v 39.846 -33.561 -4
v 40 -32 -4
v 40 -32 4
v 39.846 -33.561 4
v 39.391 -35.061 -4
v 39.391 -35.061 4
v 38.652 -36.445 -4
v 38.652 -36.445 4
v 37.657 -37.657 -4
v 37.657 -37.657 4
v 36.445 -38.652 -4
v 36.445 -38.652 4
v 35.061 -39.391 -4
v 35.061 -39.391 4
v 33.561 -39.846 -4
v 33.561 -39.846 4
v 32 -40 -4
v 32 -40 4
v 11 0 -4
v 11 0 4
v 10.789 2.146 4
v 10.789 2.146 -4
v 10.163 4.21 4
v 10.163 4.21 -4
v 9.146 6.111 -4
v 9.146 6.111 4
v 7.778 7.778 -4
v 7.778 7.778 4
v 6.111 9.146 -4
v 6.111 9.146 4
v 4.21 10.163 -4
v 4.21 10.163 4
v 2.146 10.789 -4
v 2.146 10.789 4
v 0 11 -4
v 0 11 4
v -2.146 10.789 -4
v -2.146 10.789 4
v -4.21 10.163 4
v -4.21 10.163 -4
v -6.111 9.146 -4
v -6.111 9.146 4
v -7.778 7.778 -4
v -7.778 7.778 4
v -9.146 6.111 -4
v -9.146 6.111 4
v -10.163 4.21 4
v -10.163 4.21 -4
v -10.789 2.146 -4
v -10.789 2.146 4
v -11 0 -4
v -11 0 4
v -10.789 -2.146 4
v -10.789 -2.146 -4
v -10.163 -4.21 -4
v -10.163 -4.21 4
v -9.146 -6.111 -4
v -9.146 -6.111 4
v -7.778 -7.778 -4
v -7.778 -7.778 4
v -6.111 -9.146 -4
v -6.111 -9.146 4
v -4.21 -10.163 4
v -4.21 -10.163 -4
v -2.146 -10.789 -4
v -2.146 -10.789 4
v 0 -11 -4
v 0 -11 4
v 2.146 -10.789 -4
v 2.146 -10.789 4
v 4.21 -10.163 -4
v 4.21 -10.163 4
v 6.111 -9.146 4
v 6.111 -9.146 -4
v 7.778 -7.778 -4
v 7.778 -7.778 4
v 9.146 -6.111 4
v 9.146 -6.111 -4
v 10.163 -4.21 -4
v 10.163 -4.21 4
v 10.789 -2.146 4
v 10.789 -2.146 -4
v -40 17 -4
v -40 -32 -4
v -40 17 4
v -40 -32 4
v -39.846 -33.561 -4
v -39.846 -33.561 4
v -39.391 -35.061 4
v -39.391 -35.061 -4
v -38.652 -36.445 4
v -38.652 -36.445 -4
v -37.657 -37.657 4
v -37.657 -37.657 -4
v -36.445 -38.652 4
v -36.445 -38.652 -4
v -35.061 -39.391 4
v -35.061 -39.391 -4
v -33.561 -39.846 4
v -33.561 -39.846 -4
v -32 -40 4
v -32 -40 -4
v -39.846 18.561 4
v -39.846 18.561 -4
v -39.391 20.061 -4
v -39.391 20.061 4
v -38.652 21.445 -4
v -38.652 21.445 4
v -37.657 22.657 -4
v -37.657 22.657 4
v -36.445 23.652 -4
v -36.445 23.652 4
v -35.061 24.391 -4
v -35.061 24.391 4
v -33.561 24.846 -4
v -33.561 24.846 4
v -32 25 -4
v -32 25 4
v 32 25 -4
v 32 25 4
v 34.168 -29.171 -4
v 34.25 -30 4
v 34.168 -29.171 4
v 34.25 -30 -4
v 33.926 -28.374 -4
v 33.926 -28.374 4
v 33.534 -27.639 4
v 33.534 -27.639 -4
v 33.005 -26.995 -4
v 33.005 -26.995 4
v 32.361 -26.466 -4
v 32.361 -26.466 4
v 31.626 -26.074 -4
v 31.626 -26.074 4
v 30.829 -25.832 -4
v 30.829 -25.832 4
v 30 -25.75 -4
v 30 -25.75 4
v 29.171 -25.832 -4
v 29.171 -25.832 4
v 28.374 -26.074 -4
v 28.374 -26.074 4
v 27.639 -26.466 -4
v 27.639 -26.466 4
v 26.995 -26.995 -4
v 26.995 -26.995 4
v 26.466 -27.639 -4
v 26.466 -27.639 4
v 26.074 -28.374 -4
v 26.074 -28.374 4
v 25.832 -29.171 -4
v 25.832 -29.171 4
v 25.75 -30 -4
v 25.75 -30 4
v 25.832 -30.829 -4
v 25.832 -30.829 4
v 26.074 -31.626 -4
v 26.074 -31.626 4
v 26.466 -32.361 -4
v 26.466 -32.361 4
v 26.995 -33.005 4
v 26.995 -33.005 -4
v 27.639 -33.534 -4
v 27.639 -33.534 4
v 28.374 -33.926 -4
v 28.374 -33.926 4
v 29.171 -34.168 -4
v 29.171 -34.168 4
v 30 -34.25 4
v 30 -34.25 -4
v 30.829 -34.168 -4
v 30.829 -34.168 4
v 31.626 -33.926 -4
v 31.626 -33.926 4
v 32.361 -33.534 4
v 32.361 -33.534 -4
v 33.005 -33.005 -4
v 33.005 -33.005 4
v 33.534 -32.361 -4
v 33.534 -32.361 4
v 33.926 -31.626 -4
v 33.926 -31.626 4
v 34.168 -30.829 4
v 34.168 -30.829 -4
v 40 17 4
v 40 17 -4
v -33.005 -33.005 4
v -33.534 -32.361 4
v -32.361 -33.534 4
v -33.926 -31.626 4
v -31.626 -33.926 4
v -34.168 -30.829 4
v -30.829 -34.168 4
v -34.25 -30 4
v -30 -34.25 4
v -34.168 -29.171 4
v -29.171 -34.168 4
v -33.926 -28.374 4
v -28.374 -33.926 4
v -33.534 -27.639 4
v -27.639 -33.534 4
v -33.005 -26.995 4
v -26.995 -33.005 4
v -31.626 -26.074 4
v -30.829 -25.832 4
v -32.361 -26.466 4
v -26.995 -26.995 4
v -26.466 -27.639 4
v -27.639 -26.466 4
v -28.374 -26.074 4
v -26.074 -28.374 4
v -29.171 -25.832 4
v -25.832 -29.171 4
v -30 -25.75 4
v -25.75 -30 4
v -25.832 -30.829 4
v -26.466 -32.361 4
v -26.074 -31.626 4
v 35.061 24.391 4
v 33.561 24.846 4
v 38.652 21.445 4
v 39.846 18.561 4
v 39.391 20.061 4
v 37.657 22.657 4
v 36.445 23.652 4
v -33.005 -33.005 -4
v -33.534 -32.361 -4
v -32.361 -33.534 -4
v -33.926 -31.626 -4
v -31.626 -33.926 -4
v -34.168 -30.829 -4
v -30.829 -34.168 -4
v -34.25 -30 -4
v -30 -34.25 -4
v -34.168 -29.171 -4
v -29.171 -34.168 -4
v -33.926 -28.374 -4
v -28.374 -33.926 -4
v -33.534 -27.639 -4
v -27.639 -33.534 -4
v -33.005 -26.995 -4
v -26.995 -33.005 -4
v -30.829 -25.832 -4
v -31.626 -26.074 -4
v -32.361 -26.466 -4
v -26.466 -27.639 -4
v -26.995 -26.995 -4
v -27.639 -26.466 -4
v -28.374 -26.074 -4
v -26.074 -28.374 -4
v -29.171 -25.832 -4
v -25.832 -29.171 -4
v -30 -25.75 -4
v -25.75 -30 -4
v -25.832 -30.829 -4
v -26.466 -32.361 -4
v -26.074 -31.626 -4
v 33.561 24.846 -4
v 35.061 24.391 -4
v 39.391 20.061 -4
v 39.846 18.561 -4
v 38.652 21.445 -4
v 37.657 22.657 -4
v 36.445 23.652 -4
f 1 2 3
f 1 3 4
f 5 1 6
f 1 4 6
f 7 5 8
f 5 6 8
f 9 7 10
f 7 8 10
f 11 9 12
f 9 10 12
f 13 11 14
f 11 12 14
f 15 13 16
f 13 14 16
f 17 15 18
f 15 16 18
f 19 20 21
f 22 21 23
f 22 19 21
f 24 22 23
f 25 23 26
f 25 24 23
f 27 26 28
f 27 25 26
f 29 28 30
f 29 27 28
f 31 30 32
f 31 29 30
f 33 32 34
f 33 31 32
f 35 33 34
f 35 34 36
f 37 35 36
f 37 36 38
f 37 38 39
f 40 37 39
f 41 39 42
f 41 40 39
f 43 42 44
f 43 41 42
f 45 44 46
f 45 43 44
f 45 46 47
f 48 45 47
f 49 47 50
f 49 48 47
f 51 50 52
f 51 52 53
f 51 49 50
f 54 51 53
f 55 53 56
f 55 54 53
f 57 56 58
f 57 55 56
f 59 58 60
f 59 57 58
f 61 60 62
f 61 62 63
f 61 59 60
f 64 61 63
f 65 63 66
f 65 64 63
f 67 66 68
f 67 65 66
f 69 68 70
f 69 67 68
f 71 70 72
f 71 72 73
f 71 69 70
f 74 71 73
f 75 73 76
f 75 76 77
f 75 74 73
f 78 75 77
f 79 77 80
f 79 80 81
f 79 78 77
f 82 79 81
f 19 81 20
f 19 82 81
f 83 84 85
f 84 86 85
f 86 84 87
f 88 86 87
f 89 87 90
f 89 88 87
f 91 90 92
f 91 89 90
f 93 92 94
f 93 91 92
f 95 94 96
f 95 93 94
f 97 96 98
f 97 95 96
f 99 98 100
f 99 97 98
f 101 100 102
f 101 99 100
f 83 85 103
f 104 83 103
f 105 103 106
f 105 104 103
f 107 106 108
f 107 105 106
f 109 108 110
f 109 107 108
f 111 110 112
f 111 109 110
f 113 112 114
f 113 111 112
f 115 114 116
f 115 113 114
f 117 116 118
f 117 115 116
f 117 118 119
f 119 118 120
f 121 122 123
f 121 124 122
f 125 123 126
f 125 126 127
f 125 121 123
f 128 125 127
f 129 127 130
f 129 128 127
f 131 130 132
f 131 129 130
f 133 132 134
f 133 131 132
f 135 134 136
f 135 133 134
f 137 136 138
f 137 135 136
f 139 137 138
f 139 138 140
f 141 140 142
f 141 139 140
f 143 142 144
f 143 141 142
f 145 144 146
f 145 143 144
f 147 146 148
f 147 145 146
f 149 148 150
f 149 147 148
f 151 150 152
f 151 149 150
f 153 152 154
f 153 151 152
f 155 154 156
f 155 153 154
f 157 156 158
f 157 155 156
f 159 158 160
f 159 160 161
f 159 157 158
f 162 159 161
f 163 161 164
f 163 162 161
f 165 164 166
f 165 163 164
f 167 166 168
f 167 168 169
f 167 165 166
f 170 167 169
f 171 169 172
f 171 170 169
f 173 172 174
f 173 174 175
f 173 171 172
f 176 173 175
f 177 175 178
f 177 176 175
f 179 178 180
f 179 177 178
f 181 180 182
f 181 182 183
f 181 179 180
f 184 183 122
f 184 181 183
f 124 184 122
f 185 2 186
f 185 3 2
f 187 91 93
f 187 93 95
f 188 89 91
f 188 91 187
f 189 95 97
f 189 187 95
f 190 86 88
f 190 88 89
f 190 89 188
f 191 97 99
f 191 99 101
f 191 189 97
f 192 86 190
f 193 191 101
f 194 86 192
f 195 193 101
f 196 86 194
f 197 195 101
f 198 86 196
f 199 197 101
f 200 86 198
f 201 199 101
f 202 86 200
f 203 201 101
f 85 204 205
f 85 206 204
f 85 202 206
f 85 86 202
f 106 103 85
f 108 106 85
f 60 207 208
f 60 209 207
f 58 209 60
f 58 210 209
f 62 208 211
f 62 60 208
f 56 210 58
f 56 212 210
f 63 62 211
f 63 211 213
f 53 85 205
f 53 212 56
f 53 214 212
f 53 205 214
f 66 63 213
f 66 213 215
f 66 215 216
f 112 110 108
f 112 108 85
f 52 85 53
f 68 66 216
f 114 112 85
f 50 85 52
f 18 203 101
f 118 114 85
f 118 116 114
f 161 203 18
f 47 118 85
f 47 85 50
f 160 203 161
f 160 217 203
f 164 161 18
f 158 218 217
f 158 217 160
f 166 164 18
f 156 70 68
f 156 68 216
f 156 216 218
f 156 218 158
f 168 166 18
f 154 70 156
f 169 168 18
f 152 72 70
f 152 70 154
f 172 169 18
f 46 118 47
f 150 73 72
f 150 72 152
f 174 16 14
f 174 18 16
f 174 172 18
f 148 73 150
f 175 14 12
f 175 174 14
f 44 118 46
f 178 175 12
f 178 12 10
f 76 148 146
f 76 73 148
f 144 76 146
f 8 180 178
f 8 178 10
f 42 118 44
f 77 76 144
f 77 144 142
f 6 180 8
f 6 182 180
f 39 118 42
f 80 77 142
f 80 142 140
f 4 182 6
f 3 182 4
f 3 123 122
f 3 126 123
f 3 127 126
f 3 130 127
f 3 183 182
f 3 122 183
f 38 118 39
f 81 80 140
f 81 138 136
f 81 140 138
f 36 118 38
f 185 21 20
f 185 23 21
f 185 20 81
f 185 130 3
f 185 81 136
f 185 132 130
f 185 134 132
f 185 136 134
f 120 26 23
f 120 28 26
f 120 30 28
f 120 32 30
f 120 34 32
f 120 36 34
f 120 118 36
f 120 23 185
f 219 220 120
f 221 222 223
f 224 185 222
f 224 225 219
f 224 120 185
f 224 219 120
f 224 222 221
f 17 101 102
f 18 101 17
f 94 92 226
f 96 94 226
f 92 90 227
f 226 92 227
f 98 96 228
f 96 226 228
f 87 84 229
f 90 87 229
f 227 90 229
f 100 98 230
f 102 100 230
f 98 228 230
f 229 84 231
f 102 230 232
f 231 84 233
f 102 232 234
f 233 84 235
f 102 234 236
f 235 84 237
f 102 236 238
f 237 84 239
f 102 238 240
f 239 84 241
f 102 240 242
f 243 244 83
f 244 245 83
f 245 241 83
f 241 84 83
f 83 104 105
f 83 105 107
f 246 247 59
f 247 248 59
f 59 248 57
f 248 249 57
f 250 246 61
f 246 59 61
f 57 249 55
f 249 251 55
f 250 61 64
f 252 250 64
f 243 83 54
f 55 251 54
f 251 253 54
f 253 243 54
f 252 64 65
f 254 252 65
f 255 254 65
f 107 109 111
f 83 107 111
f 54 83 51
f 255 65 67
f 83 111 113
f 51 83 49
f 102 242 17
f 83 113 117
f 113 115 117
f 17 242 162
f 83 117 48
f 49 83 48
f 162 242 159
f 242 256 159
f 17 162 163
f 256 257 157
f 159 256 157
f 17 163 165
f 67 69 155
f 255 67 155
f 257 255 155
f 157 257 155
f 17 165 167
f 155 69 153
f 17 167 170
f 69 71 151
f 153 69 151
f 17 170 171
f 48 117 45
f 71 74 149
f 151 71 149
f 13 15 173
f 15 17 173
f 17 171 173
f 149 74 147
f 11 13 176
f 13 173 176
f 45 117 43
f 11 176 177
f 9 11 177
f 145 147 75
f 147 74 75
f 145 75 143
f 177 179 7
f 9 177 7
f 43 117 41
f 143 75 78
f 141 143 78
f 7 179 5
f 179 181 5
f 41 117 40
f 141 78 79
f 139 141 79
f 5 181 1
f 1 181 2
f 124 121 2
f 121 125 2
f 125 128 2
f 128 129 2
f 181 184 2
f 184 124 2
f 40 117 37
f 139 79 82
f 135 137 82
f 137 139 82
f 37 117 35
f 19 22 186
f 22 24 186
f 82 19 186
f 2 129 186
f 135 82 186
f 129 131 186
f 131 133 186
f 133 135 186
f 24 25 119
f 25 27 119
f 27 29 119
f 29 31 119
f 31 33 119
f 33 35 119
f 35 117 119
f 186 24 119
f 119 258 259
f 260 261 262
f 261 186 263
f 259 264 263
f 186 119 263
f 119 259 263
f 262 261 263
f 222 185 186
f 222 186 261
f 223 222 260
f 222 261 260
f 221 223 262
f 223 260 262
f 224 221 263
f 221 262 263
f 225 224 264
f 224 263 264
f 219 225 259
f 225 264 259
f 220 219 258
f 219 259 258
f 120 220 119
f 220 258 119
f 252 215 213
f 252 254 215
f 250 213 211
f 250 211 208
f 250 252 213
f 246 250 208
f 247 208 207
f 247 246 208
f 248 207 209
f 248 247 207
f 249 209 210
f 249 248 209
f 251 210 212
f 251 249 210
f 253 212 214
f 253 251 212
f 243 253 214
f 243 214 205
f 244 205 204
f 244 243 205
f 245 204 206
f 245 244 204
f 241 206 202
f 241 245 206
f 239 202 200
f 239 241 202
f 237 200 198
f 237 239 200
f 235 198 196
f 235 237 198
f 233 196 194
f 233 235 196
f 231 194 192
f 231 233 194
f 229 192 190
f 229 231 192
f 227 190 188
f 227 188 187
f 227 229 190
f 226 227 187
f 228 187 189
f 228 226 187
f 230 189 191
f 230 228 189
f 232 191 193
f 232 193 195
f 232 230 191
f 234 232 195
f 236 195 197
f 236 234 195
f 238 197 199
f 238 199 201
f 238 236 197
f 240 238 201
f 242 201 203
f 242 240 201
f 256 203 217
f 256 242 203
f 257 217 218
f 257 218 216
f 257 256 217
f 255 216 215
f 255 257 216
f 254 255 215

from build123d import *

# Parameters (mm, degrees)
SKIZZE1_W                       = 80
SKIZZE1_H                       = 65
SKIZZE1_R                       = 11
SKIZZE1_R_2                     = 4.25
AUFSATZ_LINEAR_AUSTRAGEN1_DEPTH = 4
VERRUNDUNG1_R                   = 8


with BuildPart() as part:
    # Skizze1 → Aufsatz-Linear austragen1 (new, symmetric)
    with BuildSketch(Plane.XY):
        with Locations((0, -7.5)):
            Rectangle(SKIZZE1_W, SKIZZE1_H)
        Circle(SKIZZE1_R, mode=Mode.SUBTRACT)
        with Locations((-30, -30)):
            Circle(SKIZZE1_R_2, mode=Mode.SUBTRACT)
        with Locations((30, -30)):
            Circle(SKIZZE1_R_2, mode=Mode.SUBTRACT)
    extrude(amount=AUFSATZ_LINEAR_AUSTRAGEN1_DEPTH, both=True)

    # Verrundung1
    verrundung1_edges = [part.edges().sort_by_distance(p)[0] for p in [
        (-40, 25, 0),
        (40, 25, 0),
        (40, -40, 0),
        (-40, -40, 0),
    ]]
    fillet(verrundung1_edges, radius=VERRUNDUNG1_R)


solid = part.part
